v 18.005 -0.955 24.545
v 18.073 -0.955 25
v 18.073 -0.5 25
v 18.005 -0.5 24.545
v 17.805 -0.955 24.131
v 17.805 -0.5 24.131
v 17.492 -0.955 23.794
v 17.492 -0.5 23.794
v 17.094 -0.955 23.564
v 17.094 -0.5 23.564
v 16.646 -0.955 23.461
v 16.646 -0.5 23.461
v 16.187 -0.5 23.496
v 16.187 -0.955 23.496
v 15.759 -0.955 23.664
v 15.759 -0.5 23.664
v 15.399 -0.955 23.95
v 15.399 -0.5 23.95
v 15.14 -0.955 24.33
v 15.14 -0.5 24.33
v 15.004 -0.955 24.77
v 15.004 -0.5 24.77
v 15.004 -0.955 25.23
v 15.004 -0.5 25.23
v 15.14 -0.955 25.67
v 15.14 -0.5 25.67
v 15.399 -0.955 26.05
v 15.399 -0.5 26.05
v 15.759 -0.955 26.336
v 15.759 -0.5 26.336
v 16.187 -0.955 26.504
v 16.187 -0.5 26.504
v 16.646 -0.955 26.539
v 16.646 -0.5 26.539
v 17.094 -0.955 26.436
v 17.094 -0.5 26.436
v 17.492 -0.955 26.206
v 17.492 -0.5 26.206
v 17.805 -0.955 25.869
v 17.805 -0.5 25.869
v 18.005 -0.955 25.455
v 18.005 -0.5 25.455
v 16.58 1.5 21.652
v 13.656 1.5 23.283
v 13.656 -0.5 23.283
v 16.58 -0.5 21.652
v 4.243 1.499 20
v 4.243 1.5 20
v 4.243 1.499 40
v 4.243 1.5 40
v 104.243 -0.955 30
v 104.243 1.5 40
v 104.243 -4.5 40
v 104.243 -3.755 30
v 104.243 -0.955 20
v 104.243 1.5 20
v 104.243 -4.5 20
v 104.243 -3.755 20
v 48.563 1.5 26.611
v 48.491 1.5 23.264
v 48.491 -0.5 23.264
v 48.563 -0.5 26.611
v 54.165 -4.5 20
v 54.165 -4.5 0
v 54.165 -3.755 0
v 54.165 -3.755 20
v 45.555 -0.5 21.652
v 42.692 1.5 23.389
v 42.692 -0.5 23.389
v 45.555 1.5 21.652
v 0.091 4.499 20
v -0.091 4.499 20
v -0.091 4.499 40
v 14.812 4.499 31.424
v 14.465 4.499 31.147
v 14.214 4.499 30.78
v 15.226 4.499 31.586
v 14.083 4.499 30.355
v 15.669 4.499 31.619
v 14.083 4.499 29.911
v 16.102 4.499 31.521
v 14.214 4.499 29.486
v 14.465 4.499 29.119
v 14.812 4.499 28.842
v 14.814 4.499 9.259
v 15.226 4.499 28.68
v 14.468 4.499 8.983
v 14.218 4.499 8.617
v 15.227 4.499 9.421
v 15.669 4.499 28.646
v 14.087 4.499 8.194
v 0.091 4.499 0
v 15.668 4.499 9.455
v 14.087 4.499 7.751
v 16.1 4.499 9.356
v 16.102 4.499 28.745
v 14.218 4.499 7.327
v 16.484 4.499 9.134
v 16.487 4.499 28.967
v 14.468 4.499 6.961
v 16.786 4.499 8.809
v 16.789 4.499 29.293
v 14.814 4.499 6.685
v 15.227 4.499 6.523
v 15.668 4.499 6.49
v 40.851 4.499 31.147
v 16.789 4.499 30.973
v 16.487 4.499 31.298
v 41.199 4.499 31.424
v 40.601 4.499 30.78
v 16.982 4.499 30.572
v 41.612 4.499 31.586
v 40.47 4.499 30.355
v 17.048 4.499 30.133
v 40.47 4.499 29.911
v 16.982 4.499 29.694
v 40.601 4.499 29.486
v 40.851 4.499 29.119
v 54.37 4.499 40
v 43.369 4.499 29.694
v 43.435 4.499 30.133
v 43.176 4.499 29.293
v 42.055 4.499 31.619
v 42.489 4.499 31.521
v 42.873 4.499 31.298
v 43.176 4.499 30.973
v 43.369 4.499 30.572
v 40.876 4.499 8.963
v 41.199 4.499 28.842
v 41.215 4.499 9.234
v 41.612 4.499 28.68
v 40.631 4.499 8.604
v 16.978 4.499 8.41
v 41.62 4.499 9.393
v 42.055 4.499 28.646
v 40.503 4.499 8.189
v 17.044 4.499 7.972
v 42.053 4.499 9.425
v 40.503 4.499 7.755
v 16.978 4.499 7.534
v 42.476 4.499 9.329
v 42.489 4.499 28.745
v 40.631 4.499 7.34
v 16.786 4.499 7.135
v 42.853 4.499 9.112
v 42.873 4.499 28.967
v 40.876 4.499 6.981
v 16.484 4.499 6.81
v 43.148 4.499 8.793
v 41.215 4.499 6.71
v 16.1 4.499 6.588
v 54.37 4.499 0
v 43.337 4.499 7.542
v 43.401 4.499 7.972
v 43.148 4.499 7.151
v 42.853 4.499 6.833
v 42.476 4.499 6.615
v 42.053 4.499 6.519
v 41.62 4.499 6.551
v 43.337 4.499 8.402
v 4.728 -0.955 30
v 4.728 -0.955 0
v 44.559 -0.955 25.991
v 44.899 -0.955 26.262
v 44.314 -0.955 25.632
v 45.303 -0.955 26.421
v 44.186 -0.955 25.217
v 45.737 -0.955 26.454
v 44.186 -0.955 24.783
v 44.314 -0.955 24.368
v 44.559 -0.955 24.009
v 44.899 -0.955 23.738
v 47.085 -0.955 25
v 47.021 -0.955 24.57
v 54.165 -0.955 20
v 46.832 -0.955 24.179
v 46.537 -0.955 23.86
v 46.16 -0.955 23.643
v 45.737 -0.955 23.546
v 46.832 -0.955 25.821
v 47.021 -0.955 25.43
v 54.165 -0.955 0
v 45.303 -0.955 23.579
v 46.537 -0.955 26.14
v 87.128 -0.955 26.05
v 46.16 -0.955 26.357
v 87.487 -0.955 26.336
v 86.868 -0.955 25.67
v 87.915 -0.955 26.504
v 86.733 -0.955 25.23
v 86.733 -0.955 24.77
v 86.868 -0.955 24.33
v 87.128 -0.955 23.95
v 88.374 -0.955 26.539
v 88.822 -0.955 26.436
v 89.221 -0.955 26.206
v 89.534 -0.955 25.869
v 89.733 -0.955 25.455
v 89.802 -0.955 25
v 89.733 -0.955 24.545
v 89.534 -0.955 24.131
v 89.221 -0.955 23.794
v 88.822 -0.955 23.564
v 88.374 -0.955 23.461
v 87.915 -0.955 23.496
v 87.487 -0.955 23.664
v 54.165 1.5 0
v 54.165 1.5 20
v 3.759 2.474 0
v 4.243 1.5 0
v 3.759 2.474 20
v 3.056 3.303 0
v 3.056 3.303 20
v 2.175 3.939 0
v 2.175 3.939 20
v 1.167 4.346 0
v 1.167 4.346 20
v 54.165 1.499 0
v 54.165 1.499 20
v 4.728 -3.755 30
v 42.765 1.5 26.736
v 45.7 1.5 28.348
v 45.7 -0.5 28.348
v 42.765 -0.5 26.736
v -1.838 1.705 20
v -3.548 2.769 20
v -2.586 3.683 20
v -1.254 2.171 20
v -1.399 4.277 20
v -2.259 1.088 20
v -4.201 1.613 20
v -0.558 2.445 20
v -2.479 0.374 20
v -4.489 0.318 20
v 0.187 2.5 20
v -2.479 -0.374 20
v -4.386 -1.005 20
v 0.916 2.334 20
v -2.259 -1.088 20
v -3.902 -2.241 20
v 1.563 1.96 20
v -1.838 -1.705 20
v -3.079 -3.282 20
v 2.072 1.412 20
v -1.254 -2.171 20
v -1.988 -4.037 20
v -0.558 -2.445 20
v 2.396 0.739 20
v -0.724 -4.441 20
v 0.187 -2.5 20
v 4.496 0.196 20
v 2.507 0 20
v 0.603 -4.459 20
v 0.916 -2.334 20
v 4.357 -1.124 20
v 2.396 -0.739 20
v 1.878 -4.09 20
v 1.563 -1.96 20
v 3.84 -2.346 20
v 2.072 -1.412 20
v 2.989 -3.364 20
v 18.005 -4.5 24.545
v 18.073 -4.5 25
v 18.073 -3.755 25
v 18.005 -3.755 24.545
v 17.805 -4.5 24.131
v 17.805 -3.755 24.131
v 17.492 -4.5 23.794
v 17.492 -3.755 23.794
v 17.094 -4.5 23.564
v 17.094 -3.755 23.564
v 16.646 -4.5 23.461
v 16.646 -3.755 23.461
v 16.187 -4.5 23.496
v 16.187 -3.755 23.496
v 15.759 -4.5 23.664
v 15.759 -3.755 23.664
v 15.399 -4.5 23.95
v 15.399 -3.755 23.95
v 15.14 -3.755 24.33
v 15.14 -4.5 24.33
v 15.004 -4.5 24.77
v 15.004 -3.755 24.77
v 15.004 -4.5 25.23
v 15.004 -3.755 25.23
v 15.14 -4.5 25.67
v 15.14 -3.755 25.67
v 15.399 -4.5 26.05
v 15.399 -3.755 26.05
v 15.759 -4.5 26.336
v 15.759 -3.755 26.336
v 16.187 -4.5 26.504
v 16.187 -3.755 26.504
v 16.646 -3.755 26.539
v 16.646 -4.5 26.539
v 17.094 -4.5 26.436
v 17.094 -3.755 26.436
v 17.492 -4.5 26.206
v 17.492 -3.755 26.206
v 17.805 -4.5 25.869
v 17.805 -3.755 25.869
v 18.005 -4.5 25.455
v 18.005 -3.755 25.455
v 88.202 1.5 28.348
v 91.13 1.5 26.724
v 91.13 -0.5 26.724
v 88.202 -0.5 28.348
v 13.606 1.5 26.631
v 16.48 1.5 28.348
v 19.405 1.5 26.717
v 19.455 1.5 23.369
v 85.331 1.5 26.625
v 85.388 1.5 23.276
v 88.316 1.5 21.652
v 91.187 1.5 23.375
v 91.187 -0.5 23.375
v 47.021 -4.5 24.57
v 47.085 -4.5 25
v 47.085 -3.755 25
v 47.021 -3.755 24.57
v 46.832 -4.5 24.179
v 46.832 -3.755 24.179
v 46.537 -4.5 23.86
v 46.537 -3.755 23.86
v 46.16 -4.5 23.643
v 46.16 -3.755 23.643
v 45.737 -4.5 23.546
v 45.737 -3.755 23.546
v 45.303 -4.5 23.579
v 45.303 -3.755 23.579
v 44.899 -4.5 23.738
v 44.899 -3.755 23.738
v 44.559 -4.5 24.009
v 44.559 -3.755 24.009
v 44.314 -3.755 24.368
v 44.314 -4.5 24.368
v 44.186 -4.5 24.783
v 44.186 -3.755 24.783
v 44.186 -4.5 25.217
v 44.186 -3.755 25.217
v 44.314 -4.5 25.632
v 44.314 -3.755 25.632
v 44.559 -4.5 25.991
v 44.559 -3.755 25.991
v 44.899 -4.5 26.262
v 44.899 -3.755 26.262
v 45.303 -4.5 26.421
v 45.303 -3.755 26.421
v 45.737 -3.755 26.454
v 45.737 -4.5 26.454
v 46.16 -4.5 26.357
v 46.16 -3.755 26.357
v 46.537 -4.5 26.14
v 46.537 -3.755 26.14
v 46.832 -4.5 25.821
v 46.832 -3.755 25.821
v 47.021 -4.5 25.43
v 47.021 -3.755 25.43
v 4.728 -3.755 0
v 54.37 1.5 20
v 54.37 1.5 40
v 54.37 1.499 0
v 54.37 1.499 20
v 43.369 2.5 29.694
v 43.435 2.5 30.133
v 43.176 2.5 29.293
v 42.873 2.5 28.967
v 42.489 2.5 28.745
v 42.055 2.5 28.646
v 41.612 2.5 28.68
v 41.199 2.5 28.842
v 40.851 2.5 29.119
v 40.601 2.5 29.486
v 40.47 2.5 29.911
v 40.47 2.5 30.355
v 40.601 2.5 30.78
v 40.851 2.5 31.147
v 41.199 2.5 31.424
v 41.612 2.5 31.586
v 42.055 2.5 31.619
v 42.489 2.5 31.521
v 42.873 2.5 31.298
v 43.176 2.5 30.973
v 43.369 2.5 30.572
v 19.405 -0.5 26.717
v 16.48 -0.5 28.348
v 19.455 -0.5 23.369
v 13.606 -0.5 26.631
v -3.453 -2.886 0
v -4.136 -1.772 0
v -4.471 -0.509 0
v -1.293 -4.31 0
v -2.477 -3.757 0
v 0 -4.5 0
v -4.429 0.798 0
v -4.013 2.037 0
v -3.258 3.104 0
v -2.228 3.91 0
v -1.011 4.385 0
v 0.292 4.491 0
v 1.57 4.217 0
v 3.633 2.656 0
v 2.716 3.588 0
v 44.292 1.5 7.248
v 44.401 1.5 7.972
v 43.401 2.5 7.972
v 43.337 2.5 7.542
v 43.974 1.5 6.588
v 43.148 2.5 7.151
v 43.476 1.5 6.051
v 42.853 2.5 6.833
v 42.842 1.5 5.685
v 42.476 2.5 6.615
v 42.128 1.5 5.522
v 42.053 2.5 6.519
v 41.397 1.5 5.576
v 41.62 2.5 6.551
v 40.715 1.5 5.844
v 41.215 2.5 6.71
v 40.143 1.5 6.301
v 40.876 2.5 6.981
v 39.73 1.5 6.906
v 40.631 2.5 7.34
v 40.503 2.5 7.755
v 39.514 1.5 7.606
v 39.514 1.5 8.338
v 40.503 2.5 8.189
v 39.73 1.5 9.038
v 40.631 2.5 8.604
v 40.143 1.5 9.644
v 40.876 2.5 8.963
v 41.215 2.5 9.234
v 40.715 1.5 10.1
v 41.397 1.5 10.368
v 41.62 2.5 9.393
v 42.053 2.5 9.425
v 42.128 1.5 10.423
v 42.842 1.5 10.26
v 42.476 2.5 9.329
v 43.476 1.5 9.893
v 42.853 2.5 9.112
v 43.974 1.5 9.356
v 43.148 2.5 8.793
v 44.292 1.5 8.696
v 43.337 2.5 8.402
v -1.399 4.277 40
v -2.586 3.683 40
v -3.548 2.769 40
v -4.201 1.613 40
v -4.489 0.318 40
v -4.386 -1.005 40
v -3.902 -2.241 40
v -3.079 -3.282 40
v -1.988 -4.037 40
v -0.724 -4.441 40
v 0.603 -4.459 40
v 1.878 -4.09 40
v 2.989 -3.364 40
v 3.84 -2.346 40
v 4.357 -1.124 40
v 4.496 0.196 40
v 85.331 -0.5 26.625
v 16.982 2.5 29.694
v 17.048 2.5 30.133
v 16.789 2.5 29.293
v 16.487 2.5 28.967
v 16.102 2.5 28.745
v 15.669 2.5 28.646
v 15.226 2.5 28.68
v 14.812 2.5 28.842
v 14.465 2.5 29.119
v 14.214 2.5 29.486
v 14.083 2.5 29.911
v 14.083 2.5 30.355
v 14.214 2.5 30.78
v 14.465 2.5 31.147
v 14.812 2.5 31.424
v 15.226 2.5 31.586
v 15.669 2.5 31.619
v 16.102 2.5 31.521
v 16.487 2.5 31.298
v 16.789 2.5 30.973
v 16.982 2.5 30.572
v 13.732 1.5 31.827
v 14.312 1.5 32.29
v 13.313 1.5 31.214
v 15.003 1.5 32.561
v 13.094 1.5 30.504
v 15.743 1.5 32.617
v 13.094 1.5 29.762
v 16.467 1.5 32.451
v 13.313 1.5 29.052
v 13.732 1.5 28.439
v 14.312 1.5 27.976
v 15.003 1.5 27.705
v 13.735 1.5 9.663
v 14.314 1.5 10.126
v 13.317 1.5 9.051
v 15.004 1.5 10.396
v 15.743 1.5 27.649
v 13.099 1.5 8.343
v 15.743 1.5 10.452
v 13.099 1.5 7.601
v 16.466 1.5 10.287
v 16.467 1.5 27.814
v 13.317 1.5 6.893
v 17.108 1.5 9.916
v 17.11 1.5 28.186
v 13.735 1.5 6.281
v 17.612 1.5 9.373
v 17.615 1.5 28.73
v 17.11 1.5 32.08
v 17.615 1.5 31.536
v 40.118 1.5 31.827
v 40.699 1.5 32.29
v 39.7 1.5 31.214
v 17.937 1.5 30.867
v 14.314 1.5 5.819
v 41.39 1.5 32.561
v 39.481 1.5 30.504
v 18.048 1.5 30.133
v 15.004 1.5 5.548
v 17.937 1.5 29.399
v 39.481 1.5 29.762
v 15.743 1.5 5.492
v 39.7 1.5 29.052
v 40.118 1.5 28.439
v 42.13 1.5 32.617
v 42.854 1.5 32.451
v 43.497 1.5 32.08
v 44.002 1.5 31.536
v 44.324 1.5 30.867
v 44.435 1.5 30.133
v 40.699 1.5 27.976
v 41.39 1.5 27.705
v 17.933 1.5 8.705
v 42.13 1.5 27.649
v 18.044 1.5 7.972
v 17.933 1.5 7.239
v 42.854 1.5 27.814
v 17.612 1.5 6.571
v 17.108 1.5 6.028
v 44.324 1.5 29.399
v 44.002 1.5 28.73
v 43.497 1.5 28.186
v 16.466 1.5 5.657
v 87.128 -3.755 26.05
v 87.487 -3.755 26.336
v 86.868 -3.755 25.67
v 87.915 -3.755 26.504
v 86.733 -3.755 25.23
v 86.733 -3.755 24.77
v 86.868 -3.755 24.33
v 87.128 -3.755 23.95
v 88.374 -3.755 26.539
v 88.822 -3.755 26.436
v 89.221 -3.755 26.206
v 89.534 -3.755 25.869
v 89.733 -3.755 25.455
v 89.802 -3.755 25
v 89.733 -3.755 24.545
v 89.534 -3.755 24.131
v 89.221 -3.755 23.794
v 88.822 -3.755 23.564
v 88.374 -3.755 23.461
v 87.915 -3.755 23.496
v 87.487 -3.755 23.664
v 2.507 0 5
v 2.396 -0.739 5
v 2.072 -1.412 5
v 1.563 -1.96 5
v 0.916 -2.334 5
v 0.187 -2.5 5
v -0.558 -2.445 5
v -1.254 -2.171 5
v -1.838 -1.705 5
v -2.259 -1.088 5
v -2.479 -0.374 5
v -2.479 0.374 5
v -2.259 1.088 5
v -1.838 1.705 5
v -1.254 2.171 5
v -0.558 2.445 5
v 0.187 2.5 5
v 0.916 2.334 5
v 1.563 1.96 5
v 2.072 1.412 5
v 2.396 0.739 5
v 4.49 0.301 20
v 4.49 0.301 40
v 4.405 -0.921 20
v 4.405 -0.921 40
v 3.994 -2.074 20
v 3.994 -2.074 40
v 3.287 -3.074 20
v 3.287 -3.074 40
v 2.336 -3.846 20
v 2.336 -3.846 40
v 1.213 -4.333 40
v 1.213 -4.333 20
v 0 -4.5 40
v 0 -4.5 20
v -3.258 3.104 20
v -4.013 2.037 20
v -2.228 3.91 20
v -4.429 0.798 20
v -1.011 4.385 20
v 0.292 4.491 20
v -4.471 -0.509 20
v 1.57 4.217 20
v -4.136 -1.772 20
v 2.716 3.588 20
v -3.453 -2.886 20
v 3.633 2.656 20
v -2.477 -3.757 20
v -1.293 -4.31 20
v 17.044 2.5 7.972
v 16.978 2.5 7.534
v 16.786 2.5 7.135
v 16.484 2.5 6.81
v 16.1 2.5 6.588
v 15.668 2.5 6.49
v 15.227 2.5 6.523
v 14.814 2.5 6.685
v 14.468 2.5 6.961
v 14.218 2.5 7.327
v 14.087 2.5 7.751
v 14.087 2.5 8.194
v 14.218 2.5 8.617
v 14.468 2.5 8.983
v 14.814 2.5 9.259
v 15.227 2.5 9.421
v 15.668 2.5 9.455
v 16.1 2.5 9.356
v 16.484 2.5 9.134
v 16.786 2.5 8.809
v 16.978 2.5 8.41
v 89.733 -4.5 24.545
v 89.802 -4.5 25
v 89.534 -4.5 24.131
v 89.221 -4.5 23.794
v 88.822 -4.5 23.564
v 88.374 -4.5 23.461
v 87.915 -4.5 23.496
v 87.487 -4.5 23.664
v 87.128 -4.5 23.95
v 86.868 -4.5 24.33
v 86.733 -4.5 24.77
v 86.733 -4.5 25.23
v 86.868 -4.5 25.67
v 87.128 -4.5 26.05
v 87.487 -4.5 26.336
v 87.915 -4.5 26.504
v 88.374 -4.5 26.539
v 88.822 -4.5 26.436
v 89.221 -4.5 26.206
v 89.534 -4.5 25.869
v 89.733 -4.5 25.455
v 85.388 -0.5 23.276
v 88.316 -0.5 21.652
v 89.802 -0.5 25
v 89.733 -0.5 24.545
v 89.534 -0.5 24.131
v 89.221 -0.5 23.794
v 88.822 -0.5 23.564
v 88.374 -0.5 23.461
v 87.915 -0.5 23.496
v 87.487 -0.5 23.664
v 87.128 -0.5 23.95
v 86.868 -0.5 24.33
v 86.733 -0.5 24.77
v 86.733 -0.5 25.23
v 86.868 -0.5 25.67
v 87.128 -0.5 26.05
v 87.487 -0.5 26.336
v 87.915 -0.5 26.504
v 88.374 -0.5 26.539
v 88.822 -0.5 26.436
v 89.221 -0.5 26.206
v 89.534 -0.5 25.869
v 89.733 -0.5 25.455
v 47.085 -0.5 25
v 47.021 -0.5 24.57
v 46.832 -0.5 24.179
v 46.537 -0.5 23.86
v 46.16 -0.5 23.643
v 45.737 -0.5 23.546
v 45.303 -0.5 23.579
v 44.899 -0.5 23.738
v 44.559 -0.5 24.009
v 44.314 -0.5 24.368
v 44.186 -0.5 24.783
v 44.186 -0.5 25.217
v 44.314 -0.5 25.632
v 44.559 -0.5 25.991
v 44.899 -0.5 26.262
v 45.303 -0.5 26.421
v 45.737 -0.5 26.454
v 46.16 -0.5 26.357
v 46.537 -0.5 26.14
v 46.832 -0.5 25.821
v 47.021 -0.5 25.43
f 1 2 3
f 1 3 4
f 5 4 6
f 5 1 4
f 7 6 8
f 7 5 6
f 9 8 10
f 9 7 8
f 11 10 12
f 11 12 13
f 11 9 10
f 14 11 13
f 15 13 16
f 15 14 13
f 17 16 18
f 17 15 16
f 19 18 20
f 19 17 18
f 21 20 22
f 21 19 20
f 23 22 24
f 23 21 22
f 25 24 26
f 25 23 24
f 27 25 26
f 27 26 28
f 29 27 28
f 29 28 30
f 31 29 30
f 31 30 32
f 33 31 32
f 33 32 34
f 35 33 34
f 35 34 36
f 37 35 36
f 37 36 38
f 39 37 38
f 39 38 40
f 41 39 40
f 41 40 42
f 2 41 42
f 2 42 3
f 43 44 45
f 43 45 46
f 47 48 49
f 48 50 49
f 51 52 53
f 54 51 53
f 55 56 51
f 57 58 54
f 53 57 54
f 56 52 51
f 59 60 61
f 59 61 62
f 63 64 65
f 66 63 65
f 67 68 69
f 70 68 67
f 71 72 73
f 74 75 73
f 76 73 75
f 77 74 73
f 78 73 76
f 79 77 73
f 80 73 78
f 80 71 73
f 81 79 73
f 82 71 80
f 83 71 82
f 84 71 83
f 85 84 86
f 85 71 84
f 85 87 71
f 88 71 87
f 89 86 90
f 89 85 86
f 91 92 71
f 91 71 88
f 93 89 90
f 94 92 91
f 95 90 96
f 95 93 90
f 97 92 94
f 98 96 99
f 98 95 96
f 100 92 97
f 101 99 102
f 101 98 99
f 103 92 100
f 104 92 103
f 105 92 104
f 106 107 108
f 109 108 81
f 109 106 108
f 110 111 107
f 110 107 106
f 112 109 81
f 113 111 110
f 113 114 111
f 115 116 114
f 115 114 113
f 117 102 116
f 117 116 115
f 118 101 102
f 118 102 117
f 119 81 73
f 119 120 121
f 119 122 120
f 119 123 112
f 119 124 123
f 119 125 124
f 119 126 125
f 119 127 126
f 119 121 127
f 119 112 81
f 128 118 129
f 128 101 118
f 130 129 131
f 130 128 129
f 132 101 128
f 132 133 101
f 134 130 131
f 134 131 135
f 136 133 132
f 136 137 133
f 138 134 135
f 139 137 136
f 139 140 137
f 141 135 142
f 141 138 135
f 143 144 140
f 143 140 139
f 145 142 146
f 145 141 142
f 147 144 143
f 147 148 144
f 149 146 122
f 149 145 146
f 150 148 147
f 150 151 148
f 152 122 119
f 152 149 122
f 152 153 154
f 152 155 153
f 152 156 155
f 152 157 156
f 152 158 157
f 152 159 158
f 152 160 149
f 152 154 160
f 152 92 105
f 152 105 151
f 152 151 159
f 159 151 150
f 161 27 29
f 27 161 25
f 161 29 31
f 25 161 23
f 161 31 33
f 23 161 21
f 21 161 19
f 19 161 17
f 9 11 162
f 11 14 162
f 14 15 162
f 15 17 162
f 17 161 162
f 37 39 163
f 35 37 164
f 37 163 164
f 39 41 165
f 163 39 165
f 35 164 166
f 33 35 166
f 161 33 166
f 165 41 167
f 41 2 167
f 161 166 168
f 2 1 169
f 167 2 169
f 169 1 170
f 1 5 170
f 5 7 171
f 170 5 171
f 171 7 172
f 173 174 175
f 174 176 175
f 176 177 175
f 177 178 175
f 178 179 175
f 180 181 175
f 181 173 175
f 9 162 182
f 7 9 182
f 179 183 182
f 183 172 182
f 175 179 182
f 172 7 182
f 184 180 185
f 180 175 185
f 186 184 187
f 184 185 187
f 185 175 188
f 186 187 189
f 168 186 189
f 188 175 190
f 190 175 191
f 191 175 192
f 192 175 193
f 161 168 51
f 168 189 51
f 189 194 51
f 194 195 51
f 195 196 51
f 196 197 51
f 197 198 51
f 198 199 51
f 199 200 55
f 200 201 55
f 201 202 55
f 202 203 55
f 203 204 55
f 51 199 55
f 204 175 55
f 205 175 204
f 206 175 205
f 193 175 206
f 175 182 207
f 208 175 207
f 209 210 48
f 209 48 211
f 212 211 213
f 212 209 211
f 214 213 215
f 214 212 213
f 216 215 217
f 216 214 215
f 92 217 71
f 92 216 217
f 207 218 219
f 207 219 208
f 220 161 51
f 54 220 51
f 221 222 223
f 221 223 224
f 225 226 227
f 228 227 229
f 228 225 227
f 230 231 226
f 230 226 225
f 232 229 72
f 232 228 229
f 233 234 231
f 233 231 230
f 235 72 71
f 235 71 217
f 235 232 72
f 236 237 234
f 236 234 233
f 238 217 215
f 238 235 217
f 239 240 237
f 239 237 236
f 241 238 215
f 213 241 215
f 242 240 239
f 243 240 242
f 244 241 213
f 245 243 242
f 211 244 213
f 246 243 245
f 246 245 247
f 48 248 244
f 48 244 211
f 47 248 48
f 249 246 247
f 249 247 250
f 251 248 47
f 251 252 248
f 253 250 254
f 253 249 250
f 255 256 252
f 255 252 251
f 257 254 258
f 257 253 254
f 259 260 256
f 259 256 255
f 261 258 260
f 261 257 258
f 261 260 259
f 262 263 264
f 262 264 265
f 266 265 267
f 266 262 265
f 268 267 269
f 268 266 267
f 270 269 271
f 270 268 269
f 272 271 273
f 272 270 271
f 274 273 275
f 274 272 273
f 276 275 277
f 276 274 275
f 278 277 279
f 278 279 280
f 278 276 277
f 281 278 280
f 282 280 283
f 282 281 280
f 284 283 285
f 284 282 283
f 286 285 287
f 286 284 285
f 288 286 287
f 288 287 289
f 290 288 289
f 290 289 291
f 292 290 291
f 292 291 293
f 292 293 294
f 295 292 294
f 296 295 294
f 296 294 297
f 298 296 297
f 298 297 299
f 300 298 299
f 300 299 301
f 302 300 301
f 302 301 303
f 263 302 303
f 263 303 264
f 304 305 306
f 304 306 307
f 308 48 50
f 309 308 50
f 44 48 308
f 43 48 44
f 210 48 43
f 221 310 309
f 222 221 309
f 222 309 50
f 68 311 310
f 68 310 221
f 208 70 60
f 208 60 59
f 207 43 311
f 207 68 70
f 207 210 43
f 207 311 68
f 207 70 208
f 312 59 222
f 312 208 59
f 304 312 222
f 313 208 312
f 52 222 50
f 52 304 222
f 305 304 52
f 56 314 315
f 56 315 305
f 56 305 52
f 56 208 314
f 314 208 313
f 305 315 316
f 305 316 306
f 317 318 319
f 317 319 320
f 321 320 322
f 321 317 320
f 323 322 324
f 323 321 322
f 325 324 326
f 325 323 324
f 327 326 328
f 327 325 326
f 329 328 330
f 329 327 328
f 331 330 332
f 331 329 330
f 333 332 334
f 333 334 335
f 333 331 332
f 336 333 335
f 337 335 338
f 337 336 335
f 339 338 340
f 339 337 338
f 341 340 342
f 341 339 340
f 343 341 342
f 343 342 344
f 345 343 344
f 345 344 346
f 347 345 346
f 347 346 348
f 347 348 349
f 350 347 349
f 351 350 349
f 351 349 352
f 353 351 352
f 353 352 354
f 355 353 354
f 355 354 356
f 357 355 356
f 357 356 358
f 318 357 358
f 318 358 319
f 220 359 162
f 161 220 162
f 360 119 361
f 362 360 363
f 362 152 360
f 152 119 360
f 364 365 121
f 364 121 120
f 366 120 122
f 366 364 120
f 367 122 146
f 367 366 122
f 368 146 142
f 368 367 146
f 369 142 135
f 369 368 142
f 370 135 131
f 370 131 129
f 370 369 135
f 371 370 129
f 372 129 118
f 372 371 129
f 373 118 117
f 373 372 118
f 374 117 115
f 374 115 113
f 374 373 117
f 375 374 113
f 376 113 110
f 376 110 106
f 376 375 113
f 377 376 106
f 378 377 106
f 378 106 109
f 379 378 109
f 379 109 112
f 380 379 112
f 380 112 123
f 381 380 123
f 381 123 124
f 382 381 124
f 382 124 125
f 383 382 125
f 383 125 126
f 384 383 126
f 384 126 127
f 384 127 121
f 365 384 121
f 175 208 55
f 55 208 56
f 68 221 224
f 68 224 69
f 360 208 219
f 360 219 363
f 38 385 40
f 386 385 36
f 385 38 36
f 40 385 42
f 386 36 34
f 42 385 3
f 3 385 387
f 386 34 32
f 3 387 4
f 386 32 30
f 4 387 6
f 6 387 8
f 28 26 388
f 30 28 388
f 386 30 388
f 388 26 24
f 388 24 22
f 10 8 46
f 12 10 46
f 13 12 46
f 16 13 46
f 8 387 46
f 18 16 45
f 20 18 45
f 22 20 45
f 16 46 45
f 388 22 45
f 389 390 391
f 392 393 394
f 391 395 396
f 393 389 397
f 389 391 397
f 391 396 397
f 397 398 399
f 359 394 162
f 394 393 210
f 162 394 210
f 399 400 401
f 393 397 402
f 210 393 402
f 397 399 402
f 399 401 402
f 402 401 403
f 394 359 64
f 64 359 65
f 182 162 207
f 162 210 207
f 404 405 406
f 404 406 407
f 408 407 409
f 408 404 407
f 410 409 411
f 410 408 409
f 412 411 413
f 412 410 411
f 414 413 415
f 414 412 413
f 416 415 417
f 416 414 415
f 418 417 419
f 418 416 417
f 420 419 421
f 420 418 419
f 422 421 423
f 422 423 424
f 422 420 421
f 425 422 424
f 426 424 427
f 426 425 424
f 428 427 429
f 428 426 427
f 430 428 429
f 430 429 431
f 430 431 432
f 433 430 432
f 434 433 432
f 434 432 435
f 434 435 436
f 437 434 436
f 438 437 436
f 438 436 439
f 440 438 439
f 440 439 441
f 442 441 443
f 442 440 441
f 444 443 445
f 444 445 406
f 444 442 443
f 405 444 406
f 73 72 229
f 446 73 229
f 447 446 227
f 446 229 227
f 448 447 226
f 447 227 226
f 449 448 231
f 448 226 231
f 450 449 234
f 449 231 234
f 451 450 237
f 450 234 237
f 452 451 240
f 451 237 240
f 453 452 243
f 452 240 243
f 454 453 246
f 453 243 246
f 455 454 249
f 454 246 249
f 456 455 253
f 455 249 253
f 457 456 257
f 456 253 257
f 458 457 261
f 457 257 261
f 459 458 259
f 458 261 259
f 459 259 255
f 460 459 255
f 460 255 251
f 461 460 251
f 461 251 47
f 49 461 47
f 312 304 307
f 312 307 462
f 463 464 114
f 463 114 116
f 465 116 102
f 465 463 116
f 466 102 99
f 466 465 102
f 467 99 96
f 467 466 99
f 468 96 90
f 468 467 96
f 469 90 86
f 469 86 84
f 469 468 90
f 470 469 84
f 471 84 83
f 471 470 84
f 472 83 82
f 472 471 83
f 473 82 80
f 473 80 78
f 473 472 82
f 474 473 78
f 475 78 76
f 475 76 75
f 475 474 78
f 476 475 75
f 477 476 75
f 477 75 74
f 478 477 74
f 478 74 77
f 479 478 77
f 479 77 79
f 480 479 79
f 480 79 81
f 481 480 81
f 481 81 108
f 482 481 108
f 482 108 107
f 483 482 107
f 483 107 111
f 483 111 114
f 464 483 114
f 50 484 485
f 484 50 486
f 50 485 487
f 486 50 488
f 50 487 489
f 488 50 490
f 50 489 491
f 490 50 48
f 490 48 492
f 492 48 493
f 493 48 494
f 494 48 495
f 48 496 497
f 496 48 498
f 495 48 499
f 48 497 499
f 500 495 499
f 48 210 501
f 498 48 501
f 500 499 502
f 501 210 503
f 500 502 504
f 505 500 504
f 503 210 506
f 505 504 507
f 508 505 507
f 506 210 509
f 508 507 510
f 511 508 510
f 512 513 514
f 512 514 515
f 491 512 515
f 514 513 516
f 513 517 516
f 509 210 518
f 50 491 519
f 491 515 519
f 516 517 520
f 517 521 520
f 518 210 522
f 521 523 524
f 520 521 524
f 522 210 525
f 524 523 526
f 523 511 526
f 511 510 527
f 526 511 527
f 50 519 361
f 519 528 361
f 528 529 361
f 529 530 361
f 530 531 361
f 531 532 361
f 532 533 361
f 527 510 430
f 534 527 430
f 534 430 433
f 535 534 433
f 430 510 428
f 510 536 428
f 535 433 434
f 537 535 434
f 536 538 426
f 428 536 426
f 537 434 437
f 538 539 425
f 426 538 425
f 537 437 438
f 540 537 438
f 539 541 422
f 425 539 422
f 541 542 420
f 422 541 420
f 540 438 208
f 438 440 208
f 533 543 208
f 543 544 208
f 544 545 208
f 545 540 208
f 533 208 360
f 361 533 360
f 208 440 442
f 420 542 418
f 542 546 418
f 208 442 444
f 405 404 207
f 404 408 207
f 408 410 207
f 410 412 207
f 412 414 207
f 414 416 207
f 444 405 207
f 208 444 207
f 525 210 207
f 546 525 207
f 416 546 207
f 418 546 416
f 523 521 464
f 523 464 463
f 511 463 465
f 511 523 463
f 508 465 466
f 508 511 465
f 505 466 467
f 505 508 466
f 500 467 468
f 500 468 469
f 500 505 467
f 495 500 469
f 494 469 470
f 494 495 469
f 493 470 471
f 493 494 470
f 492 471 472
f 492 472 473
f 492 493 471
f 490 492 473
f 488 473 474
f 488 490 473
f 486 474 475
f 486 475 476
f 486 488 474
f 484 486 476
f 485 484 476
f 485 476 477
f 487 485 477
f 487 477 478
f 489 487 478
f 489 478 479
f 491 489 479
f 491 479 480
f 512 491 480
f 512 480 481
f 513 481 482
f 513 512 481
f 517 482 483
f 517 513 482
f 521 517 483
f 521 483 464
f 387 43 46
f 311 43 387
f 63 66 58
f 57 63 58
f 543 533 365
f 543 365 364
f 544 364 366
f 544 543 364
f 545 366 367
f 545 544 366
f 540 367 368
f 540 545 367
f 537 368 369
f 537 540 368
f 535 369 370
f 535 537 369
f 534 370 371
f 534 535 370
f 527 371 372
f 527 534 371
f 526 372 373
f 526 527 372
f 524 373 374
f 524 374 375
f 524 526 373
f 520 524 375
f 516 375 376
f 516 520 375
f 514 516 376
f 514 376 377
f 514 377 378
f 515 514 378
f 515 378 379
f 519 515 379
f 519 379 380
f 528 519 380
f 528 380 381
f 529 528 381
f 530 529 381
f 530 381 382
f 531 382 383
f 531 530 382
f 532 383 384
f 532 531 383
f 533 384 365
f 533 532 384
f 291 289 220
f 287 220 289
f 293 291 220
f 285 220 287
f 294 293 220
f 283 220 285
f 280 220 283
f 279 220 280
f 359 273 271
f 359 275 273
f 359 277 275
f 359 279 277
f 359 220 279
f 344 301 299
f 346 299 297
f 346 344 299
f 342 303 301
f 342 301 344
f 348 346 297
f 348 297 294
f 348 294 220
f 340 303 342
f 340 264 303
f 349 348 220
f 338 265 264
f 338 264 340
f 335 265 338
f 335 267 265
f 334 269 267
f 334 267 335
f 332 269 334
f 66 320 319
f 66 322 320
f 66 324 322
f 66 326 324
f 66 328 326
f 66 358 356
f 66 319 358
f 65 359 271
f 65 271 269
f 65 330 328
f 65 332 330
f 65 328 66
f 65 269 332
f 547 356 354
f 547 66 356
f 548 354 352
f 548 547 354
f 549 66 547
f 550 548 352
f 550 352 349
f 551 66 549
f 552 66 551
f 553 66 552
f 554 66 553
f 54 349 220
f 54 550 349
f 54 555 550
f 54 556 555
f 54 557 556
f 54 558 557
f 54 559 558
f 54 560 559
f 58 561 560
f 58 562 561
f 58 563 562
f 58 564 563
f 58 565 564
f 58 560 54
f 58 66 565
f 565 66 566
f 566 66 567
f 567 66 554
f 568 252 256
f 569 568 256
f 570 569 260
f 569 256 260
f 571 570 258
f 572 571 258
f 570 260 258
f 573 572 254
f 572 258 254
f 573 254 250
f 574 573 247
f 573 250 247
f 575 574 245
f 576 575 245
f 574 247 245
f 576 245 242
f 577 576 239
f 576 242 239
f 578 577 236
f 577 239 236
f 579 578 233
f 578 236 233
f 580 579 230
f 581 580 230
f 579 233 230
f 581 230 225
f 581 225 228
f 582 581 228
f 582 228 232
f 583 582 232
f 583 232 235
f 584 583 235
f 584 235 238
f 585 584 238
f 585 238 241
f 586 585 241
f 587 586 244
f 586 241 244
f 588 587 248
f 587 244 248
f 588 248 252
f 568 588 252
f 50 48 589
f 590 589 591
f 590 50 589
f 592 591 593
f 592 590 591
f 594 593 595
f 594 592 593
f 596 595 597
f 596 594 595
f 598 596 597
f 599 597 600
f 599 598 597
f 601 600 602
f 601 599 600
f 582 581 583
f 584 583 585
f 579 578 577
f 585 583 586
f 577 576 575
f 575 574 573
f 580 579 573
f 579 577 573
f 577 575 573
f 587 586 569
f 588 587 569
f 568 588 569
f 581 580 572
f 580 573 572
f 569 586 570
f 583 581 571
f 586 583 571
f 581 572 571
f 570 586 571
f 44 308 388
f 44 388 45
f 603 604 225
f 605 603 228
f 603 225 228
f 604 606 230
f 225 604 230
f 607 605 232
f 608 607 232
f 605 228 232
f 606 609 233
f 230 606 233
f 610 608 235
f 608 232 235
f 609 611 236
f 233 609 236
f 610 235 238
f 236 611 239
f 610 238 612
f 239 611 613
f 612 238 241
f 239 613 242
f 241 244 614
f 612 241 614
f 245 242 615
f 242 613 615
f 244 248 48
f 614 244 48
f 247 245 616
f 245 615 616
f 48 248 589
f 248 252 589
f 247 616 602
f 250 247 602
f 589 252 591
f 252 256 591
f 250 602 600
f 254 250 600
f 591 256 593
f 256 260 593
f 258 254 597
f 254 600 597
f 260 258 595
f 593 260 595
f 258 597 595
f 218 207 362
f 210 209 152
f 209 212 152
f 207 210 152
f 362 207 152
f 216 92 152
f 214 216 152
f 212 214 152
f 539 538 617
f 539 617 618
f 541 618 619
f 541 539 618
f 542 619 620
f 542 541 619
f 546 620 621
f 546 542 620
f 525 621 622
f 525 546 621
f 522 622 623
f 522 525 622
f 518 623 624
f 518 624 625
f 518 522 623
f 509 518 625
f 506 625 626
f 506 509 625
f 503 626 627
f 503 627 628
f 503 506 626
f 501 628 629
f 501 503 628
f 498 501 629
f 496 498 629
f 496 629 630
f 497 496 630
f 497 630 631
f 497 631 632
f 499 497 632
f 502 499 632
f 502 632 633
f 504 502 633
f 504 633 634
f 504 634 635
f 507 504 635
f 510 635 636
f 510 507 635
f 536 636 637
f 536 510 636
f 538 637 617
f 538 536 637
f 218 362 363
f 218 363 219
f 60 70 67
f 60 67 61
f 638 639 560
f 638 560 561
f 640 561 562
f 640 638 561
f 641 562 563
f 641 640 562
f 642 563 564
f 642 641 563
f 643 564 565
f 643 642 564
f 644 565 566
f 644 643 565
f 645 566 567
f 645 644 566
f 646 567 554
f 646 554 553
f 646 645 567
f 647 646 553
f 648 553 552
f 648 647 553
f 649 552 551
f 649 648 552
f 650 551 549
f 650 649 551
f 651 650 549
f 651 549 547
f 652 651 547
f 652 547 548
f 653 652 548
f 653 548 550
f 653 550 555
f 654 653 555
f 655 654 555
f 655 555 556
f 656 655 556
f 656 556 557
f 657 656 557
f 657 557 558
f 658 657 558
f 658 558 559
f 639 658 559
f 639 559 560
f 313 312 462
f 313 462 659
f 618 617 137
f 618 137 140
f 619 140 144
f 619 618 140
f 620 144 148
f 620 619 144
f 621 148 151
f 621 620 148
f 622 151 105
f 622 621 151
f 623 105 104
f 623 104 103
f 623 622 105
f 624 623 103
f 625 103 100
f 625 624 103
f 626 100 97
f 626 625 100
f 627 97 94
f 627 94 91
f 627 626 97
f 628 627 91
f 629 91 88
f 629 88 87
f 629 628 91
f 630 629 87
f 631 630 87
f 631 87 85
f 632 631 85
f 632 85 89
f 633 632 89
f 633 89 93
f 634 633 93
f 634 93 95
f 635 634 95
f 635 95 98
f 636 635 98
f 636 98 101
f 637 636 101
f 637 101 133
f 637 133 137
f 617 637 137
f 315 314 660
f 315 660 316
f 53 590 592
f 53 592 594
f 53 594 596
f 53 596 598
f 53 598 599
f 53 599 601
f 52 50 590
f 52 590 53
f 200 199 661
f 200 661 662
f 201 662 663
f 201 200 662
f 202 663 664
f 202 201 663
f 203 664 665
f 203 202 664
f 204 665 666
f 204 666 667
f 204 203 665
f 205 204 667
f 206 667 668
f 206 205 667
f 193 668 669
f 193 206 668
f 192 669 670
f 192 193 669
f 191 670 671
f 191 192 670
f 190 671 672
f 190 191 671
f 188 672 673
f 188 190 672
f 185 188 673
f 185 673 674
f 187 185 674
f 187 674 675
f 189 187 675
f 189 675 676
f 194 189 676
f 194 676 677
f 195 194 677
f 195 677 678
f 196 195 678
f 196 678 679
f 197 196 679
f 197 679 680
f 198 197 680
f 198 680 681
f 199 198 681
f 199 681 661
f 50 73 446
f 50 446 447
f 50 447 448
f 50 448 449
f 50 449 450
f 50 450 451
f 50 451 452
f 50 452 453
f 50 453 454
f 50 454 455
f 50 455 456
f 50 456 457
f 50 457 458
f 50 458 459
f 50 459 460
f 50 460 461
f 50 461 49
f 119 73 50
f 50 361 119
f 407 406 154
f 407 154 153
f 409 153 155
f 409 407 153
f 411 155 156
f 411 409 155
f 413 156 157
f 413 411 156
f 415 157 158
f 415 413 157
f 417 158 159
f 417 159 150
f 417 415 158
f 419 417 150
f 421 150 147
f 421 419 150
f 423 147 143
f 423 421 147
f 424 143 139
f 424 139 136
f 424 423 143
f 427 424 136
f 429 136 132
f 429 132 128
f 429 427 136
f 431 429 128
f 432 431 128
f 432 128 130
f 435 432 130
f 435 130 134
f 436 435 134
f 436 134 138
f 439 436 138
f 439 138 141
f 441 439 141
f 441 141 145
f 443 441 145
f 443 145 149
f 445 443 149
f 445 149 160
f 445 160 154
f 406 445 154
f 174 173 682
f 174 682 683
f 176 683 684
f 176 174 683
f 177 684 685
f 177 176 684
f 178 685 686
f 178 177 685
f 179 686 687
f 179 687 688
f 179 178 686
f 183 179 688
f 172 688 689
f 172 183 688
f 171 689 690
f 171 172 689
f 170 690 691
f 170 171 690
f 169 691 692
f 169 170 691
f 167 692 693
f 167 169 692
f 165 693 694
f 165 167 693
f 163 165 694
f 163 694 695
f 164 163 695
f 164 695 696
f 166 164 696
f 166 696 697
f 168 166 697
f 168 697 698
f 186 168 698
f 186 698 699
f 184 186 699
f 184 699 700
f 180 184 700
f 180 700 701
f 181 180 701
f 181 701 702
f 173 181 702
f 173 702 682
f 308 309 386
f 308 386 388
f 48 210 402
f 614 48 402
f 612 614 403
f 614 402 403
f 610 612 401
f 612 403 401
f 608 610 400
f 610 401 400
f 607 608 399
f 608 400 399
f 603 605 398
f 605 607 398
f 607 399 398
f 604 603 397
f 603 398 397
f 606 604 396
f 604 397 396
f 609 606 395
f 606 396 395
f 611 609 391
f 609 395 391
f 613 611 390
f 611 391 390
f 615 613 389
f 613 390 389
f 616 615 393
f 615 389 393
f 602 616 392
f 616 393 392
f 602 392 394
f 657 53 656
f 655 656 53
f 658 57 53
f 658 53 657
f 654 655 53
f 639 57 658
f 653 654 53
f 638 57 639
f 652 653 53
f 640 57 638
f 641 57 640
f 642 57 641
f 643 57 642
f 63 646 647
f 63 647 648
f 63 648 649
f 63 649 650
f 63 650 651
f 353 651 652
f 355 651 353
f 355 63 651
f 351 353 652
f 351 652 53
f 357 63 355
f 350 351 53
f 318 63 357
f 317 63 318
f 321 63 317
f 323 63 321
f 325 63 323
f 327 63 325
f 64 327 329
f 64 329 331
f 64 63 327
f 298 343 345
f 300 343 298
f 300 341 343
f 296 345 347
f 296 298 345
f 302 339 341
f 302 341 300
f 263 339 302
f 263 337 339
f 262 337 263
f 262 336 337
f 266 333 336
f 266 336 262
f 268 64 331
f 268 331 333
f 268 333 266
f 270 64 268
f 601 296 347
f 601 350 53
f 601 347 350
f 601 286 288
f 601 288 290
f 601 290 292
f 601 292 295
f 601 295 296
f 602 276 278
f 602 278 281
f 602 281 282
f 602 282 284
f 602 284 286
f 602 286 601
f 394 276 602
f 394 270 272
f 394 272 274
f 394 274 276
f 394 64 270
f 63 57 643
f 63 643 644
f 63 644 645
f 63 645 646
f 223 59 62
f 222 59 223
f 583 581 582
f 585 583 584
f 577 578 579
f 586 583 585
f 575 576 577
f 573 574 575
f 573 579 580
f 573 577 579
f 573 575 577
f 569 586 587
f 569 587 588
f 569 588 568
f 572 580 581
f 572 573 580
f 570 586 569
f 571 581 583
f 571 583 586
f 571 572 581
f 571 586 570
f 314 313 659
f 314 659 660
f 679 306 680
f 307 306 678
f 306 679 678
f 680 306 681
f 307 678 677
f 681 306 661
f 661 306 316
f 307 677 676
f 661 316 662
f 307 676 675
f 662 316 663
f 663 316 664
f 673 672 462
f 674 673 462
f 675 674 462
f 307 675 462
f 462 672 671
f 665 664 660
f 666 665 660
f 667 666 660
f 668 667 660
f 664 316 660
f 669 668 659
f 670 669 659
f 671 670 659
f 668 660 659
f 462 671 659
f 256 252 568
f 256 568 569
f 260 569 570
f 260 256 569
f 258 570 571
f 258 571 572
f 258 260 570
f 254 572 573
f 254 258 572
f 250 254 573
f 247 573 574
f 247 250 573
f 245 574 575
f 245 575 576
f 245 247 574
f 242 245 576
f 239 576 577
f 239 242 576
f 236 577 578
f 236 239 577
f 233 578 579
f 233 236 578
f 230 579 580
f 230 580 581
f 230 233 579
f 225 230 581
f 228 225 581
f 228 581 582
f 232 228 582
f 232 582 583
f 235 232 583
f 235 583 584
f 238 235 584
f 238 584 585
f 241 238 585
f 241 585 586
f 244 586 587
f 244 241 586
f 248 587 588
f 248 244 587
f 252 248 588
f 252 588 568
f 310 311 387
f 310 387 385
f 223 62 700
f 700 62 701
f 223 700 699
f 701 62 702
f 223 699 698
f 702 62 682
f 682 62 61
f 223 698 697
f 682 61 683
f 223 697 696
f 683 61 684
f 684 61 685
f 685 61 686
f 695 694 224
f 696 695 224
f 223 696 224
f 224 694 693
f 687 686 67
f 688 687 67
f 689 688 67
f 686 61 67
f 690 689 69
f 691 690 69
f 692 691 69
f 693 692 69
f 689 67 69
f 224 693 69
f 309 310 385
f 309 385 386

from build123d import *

# Parameters (mm, degrees)
PAD001_DEPTH    = 40
SKETCH002_R     = 4.5
POCKET_DEPTH    = 20
SKETCH003_R     = 2.507414
POCKET001_DEPTH = 15
SKETCH004_W     = 50.0781016871
SKETCH004_H     = 6
POCKET002_DEPTH = 20
SKETCH005_W     = 99.5143276871
SKETCH005_H     = 2.8
POCKET003_DEPTH = 30
SKETCH007_R     = 1.543073
SKETCH007_R_2   = 1.45762
POCKET005_DEPTH = 9.001
POCKET006_DEPTH = 2
PAD_DEPTH       = 40
SKETCH006_R     = 1.486591
SKETCH006_R_2   = 1.457401
SKETCH006_R_3   = 1.490716
SKETCH006_R_4   = 1.490718
POCKET004_DEPTH = 3.0000891794
CHAMFER_SIZE    = 1


with BuildPart() as cerniera_mobile:
    # Sketch001 → Pad001 (new body)
    with BuildSketch(Plane.XY):
        with BuildLine():
            ThreePointArc((4.2426406871, 1.5), (-3.6742346142, 2.5980762114), (0, -4.5))
            Line((104.2426406871, -4.5), (0, -4.5))
            Line((104.2426406871, 1.5), (104.2426406871, -4.5))
            Line((4.2426406871, 1.5), (104.2426406871, 1.5))
        make_face()
    extrude(amount=-PAD001_DEPTH)

    # Sketch002 → Pocket (cut)
    with BuildSketch(Plane(origin=(0, 0, -40), x_dir=(1, 0, 0), z_dir=(0, 0, -1))):
        Circle(SKETCH002_R)
    extrude(amount=-POCKET_DEPTH, mode=Mode.SUBTRACT)

    # Sketch003 → Pocket001 (cut)
    with BuildSketch(Plane(origin=(0, 0, -20), x_dir=(1, 0, 0), z_dir=(0, 0, -1))):
        Circle(SKETCH003_R)
    extrude(amount=-POCKET001_DEPTH, mode=Mode.SUBTRACT)

    # Sketch004 → Pocket002 (cut)
    with BuildSketch(Plane.XY):
        with Locations((79.2035898436, -1.5)):
            Rectangle(SKETCH004_W, SKETCH004_H)
    extrude(amount=-POCKET002_DEPTH, mode=Mode.SUBTRACT)

    # Sketch005 → Pocket003 (cut)
    with BuildSketch(Plane.XY):
        with Locations((54.4854768436, -2.354658)):
            Rectangle(SKETCH005_W, SKETCH005_H)
    extrude(amount=-POCKET003_DEPTH, mode=Mode.SUBTRACT)


with BuildPart() as cerniera_mobile_con_dadi:
    # Pocket005 base: copy of cerniera_mobile
    add(cerniera_mobile.part)

    # Sketch007 → Pocket005 (cut, through all)
    with BuildSketch(Plane.XZ.offset(4.5)):
        with Locations((88.258736, -25)):
            Circle(SKETCH007_R)
        with Locations((16.530338, -25)):
            Circle(SKETCH007_R)
        with Locations((45.627708, -25)):
            Circle(SKETCH007_R_2)
    extrude(amount=-POCKET005_DEPTH, mode=Mode.SUBTRACT)

    # Sketch008 → Pocket006 (cut)
    with BuildSketch(Plane(origin=(0, 1.5, 0), x_dir=(-1, 0, 0), z_dir=(0, 1, 0))):
        Polygon((-42.6922637743, -23.3886339549), (-45.555469817, -21.6521477066), (-48.4909140427, -23.2635137517), (-48.5631522257, -26.6113660451), (-45.699946183, -28.3478522934), (-42.7645019573, -26.7364862483), align=None)
        Polygon((-13.6555894593, -23.2826898472), (-16.5801979482, -21.6517396578), (-19.4549464889, -23.3690498107), (-19.4050865407, -26.7173101528), (-16.4804780518, -28.3482603422), (-13.6057295111, -26.6309501893), align=None)
        Polygon((-85.3305509675, -26.6245201596), (-85.3877677566, -23.2763774547), (-88.3159527891, -21.6518572951), (-91.1869210325, -23.3754798404), (-91.1297042434, -26.7236225453), (-88.2015192109, -28.3481427049), align=None)
    extrude(amount=-POCKET006_DEPTH, mode=Mode.SUBTRACT)


with BuildPart() as part_mirroring:
    # Part__Mirroring: instance of cerniera_mobile_con_dadi
    add(cerniera_mobile_con_dadi.part.mirror(Plane(origin=(0, 0, 0), x_dir=(0, 1, 0), z_dir=(0, 0, 1))))


with BuildPart() as cerniera_fissa_buchi_svasati:
    # Sketch → Pad (new body)
    with BuildSketch(Plane.XY):
        with BuildLine():
            ThreePointArc((-0.0905348327, 4.4990891794), (-2.561379334, -3.6999102567), (4.2429626009, 1.4990891794))
            Line((54.3700859693, 1.4990891794), (4.2429626009, 1.4990891794))
            Line((54.3700859693, 4.4990891794), (54.3700859693, 1.4990891794))
            Line((-0.0905348327, 4.4990891794), (54.3700859693, 4.4990891794))
        make_face()
    extrude(amount=-PAD_DEPTH)

    # Cut: cut cerniera_mobile
    add(cerniera_mobile.part, mode=Mode.SUBTRACT)

    # Sketch006 → Pocket004 (cut, through all)
    with BuildSketch(Plane.XZ.offset(-1.5)):
        with Locations((15.5573463219, -7.972067)):
            Circle(SKETCH006_R)
        with Locations((41.9440455, -7.972067)):
            Circle(SKETCH006_R_2)
        with Locations((15.5573463219, -30.132898)):
            Circle(SKETCH006_R_3)
        with Locations((41.9440455, -30.132898)):
            Circle(SKETCH006_R_4)
    extrude(amount=-POCKET004_DEPTH, mode=Mode.SUBTRACT)

    # Chamfer
    chamfer_edges = [cerniera_fissa_buchi_svasati.edges().sort_by_distance(p)[0] for p in [
        (14.070755, 1.5, -7.972067),
        (40.486645, 1.5, -7.972067),
        (40.453328, 1.5, -30.132898),
        (14.06663, 1.5, -30.132898),
    ]]
    chamfer(chamfer_edges, length=CHAMFER_SIZE)


with BuildPart() as part_mirroring001:
    # Part__Mirroring001: instance of cerniera_fissa_buchi_svasati
    add(cerniera_fissa_buchi_svasati.part.mirror(Plane(origin=(0, 0, 0), x_dir=(0, 1, 0), z_dir=(0, 0, 1))))


solid = Compound([part_mirroring.part, part_mirroring001.part])
